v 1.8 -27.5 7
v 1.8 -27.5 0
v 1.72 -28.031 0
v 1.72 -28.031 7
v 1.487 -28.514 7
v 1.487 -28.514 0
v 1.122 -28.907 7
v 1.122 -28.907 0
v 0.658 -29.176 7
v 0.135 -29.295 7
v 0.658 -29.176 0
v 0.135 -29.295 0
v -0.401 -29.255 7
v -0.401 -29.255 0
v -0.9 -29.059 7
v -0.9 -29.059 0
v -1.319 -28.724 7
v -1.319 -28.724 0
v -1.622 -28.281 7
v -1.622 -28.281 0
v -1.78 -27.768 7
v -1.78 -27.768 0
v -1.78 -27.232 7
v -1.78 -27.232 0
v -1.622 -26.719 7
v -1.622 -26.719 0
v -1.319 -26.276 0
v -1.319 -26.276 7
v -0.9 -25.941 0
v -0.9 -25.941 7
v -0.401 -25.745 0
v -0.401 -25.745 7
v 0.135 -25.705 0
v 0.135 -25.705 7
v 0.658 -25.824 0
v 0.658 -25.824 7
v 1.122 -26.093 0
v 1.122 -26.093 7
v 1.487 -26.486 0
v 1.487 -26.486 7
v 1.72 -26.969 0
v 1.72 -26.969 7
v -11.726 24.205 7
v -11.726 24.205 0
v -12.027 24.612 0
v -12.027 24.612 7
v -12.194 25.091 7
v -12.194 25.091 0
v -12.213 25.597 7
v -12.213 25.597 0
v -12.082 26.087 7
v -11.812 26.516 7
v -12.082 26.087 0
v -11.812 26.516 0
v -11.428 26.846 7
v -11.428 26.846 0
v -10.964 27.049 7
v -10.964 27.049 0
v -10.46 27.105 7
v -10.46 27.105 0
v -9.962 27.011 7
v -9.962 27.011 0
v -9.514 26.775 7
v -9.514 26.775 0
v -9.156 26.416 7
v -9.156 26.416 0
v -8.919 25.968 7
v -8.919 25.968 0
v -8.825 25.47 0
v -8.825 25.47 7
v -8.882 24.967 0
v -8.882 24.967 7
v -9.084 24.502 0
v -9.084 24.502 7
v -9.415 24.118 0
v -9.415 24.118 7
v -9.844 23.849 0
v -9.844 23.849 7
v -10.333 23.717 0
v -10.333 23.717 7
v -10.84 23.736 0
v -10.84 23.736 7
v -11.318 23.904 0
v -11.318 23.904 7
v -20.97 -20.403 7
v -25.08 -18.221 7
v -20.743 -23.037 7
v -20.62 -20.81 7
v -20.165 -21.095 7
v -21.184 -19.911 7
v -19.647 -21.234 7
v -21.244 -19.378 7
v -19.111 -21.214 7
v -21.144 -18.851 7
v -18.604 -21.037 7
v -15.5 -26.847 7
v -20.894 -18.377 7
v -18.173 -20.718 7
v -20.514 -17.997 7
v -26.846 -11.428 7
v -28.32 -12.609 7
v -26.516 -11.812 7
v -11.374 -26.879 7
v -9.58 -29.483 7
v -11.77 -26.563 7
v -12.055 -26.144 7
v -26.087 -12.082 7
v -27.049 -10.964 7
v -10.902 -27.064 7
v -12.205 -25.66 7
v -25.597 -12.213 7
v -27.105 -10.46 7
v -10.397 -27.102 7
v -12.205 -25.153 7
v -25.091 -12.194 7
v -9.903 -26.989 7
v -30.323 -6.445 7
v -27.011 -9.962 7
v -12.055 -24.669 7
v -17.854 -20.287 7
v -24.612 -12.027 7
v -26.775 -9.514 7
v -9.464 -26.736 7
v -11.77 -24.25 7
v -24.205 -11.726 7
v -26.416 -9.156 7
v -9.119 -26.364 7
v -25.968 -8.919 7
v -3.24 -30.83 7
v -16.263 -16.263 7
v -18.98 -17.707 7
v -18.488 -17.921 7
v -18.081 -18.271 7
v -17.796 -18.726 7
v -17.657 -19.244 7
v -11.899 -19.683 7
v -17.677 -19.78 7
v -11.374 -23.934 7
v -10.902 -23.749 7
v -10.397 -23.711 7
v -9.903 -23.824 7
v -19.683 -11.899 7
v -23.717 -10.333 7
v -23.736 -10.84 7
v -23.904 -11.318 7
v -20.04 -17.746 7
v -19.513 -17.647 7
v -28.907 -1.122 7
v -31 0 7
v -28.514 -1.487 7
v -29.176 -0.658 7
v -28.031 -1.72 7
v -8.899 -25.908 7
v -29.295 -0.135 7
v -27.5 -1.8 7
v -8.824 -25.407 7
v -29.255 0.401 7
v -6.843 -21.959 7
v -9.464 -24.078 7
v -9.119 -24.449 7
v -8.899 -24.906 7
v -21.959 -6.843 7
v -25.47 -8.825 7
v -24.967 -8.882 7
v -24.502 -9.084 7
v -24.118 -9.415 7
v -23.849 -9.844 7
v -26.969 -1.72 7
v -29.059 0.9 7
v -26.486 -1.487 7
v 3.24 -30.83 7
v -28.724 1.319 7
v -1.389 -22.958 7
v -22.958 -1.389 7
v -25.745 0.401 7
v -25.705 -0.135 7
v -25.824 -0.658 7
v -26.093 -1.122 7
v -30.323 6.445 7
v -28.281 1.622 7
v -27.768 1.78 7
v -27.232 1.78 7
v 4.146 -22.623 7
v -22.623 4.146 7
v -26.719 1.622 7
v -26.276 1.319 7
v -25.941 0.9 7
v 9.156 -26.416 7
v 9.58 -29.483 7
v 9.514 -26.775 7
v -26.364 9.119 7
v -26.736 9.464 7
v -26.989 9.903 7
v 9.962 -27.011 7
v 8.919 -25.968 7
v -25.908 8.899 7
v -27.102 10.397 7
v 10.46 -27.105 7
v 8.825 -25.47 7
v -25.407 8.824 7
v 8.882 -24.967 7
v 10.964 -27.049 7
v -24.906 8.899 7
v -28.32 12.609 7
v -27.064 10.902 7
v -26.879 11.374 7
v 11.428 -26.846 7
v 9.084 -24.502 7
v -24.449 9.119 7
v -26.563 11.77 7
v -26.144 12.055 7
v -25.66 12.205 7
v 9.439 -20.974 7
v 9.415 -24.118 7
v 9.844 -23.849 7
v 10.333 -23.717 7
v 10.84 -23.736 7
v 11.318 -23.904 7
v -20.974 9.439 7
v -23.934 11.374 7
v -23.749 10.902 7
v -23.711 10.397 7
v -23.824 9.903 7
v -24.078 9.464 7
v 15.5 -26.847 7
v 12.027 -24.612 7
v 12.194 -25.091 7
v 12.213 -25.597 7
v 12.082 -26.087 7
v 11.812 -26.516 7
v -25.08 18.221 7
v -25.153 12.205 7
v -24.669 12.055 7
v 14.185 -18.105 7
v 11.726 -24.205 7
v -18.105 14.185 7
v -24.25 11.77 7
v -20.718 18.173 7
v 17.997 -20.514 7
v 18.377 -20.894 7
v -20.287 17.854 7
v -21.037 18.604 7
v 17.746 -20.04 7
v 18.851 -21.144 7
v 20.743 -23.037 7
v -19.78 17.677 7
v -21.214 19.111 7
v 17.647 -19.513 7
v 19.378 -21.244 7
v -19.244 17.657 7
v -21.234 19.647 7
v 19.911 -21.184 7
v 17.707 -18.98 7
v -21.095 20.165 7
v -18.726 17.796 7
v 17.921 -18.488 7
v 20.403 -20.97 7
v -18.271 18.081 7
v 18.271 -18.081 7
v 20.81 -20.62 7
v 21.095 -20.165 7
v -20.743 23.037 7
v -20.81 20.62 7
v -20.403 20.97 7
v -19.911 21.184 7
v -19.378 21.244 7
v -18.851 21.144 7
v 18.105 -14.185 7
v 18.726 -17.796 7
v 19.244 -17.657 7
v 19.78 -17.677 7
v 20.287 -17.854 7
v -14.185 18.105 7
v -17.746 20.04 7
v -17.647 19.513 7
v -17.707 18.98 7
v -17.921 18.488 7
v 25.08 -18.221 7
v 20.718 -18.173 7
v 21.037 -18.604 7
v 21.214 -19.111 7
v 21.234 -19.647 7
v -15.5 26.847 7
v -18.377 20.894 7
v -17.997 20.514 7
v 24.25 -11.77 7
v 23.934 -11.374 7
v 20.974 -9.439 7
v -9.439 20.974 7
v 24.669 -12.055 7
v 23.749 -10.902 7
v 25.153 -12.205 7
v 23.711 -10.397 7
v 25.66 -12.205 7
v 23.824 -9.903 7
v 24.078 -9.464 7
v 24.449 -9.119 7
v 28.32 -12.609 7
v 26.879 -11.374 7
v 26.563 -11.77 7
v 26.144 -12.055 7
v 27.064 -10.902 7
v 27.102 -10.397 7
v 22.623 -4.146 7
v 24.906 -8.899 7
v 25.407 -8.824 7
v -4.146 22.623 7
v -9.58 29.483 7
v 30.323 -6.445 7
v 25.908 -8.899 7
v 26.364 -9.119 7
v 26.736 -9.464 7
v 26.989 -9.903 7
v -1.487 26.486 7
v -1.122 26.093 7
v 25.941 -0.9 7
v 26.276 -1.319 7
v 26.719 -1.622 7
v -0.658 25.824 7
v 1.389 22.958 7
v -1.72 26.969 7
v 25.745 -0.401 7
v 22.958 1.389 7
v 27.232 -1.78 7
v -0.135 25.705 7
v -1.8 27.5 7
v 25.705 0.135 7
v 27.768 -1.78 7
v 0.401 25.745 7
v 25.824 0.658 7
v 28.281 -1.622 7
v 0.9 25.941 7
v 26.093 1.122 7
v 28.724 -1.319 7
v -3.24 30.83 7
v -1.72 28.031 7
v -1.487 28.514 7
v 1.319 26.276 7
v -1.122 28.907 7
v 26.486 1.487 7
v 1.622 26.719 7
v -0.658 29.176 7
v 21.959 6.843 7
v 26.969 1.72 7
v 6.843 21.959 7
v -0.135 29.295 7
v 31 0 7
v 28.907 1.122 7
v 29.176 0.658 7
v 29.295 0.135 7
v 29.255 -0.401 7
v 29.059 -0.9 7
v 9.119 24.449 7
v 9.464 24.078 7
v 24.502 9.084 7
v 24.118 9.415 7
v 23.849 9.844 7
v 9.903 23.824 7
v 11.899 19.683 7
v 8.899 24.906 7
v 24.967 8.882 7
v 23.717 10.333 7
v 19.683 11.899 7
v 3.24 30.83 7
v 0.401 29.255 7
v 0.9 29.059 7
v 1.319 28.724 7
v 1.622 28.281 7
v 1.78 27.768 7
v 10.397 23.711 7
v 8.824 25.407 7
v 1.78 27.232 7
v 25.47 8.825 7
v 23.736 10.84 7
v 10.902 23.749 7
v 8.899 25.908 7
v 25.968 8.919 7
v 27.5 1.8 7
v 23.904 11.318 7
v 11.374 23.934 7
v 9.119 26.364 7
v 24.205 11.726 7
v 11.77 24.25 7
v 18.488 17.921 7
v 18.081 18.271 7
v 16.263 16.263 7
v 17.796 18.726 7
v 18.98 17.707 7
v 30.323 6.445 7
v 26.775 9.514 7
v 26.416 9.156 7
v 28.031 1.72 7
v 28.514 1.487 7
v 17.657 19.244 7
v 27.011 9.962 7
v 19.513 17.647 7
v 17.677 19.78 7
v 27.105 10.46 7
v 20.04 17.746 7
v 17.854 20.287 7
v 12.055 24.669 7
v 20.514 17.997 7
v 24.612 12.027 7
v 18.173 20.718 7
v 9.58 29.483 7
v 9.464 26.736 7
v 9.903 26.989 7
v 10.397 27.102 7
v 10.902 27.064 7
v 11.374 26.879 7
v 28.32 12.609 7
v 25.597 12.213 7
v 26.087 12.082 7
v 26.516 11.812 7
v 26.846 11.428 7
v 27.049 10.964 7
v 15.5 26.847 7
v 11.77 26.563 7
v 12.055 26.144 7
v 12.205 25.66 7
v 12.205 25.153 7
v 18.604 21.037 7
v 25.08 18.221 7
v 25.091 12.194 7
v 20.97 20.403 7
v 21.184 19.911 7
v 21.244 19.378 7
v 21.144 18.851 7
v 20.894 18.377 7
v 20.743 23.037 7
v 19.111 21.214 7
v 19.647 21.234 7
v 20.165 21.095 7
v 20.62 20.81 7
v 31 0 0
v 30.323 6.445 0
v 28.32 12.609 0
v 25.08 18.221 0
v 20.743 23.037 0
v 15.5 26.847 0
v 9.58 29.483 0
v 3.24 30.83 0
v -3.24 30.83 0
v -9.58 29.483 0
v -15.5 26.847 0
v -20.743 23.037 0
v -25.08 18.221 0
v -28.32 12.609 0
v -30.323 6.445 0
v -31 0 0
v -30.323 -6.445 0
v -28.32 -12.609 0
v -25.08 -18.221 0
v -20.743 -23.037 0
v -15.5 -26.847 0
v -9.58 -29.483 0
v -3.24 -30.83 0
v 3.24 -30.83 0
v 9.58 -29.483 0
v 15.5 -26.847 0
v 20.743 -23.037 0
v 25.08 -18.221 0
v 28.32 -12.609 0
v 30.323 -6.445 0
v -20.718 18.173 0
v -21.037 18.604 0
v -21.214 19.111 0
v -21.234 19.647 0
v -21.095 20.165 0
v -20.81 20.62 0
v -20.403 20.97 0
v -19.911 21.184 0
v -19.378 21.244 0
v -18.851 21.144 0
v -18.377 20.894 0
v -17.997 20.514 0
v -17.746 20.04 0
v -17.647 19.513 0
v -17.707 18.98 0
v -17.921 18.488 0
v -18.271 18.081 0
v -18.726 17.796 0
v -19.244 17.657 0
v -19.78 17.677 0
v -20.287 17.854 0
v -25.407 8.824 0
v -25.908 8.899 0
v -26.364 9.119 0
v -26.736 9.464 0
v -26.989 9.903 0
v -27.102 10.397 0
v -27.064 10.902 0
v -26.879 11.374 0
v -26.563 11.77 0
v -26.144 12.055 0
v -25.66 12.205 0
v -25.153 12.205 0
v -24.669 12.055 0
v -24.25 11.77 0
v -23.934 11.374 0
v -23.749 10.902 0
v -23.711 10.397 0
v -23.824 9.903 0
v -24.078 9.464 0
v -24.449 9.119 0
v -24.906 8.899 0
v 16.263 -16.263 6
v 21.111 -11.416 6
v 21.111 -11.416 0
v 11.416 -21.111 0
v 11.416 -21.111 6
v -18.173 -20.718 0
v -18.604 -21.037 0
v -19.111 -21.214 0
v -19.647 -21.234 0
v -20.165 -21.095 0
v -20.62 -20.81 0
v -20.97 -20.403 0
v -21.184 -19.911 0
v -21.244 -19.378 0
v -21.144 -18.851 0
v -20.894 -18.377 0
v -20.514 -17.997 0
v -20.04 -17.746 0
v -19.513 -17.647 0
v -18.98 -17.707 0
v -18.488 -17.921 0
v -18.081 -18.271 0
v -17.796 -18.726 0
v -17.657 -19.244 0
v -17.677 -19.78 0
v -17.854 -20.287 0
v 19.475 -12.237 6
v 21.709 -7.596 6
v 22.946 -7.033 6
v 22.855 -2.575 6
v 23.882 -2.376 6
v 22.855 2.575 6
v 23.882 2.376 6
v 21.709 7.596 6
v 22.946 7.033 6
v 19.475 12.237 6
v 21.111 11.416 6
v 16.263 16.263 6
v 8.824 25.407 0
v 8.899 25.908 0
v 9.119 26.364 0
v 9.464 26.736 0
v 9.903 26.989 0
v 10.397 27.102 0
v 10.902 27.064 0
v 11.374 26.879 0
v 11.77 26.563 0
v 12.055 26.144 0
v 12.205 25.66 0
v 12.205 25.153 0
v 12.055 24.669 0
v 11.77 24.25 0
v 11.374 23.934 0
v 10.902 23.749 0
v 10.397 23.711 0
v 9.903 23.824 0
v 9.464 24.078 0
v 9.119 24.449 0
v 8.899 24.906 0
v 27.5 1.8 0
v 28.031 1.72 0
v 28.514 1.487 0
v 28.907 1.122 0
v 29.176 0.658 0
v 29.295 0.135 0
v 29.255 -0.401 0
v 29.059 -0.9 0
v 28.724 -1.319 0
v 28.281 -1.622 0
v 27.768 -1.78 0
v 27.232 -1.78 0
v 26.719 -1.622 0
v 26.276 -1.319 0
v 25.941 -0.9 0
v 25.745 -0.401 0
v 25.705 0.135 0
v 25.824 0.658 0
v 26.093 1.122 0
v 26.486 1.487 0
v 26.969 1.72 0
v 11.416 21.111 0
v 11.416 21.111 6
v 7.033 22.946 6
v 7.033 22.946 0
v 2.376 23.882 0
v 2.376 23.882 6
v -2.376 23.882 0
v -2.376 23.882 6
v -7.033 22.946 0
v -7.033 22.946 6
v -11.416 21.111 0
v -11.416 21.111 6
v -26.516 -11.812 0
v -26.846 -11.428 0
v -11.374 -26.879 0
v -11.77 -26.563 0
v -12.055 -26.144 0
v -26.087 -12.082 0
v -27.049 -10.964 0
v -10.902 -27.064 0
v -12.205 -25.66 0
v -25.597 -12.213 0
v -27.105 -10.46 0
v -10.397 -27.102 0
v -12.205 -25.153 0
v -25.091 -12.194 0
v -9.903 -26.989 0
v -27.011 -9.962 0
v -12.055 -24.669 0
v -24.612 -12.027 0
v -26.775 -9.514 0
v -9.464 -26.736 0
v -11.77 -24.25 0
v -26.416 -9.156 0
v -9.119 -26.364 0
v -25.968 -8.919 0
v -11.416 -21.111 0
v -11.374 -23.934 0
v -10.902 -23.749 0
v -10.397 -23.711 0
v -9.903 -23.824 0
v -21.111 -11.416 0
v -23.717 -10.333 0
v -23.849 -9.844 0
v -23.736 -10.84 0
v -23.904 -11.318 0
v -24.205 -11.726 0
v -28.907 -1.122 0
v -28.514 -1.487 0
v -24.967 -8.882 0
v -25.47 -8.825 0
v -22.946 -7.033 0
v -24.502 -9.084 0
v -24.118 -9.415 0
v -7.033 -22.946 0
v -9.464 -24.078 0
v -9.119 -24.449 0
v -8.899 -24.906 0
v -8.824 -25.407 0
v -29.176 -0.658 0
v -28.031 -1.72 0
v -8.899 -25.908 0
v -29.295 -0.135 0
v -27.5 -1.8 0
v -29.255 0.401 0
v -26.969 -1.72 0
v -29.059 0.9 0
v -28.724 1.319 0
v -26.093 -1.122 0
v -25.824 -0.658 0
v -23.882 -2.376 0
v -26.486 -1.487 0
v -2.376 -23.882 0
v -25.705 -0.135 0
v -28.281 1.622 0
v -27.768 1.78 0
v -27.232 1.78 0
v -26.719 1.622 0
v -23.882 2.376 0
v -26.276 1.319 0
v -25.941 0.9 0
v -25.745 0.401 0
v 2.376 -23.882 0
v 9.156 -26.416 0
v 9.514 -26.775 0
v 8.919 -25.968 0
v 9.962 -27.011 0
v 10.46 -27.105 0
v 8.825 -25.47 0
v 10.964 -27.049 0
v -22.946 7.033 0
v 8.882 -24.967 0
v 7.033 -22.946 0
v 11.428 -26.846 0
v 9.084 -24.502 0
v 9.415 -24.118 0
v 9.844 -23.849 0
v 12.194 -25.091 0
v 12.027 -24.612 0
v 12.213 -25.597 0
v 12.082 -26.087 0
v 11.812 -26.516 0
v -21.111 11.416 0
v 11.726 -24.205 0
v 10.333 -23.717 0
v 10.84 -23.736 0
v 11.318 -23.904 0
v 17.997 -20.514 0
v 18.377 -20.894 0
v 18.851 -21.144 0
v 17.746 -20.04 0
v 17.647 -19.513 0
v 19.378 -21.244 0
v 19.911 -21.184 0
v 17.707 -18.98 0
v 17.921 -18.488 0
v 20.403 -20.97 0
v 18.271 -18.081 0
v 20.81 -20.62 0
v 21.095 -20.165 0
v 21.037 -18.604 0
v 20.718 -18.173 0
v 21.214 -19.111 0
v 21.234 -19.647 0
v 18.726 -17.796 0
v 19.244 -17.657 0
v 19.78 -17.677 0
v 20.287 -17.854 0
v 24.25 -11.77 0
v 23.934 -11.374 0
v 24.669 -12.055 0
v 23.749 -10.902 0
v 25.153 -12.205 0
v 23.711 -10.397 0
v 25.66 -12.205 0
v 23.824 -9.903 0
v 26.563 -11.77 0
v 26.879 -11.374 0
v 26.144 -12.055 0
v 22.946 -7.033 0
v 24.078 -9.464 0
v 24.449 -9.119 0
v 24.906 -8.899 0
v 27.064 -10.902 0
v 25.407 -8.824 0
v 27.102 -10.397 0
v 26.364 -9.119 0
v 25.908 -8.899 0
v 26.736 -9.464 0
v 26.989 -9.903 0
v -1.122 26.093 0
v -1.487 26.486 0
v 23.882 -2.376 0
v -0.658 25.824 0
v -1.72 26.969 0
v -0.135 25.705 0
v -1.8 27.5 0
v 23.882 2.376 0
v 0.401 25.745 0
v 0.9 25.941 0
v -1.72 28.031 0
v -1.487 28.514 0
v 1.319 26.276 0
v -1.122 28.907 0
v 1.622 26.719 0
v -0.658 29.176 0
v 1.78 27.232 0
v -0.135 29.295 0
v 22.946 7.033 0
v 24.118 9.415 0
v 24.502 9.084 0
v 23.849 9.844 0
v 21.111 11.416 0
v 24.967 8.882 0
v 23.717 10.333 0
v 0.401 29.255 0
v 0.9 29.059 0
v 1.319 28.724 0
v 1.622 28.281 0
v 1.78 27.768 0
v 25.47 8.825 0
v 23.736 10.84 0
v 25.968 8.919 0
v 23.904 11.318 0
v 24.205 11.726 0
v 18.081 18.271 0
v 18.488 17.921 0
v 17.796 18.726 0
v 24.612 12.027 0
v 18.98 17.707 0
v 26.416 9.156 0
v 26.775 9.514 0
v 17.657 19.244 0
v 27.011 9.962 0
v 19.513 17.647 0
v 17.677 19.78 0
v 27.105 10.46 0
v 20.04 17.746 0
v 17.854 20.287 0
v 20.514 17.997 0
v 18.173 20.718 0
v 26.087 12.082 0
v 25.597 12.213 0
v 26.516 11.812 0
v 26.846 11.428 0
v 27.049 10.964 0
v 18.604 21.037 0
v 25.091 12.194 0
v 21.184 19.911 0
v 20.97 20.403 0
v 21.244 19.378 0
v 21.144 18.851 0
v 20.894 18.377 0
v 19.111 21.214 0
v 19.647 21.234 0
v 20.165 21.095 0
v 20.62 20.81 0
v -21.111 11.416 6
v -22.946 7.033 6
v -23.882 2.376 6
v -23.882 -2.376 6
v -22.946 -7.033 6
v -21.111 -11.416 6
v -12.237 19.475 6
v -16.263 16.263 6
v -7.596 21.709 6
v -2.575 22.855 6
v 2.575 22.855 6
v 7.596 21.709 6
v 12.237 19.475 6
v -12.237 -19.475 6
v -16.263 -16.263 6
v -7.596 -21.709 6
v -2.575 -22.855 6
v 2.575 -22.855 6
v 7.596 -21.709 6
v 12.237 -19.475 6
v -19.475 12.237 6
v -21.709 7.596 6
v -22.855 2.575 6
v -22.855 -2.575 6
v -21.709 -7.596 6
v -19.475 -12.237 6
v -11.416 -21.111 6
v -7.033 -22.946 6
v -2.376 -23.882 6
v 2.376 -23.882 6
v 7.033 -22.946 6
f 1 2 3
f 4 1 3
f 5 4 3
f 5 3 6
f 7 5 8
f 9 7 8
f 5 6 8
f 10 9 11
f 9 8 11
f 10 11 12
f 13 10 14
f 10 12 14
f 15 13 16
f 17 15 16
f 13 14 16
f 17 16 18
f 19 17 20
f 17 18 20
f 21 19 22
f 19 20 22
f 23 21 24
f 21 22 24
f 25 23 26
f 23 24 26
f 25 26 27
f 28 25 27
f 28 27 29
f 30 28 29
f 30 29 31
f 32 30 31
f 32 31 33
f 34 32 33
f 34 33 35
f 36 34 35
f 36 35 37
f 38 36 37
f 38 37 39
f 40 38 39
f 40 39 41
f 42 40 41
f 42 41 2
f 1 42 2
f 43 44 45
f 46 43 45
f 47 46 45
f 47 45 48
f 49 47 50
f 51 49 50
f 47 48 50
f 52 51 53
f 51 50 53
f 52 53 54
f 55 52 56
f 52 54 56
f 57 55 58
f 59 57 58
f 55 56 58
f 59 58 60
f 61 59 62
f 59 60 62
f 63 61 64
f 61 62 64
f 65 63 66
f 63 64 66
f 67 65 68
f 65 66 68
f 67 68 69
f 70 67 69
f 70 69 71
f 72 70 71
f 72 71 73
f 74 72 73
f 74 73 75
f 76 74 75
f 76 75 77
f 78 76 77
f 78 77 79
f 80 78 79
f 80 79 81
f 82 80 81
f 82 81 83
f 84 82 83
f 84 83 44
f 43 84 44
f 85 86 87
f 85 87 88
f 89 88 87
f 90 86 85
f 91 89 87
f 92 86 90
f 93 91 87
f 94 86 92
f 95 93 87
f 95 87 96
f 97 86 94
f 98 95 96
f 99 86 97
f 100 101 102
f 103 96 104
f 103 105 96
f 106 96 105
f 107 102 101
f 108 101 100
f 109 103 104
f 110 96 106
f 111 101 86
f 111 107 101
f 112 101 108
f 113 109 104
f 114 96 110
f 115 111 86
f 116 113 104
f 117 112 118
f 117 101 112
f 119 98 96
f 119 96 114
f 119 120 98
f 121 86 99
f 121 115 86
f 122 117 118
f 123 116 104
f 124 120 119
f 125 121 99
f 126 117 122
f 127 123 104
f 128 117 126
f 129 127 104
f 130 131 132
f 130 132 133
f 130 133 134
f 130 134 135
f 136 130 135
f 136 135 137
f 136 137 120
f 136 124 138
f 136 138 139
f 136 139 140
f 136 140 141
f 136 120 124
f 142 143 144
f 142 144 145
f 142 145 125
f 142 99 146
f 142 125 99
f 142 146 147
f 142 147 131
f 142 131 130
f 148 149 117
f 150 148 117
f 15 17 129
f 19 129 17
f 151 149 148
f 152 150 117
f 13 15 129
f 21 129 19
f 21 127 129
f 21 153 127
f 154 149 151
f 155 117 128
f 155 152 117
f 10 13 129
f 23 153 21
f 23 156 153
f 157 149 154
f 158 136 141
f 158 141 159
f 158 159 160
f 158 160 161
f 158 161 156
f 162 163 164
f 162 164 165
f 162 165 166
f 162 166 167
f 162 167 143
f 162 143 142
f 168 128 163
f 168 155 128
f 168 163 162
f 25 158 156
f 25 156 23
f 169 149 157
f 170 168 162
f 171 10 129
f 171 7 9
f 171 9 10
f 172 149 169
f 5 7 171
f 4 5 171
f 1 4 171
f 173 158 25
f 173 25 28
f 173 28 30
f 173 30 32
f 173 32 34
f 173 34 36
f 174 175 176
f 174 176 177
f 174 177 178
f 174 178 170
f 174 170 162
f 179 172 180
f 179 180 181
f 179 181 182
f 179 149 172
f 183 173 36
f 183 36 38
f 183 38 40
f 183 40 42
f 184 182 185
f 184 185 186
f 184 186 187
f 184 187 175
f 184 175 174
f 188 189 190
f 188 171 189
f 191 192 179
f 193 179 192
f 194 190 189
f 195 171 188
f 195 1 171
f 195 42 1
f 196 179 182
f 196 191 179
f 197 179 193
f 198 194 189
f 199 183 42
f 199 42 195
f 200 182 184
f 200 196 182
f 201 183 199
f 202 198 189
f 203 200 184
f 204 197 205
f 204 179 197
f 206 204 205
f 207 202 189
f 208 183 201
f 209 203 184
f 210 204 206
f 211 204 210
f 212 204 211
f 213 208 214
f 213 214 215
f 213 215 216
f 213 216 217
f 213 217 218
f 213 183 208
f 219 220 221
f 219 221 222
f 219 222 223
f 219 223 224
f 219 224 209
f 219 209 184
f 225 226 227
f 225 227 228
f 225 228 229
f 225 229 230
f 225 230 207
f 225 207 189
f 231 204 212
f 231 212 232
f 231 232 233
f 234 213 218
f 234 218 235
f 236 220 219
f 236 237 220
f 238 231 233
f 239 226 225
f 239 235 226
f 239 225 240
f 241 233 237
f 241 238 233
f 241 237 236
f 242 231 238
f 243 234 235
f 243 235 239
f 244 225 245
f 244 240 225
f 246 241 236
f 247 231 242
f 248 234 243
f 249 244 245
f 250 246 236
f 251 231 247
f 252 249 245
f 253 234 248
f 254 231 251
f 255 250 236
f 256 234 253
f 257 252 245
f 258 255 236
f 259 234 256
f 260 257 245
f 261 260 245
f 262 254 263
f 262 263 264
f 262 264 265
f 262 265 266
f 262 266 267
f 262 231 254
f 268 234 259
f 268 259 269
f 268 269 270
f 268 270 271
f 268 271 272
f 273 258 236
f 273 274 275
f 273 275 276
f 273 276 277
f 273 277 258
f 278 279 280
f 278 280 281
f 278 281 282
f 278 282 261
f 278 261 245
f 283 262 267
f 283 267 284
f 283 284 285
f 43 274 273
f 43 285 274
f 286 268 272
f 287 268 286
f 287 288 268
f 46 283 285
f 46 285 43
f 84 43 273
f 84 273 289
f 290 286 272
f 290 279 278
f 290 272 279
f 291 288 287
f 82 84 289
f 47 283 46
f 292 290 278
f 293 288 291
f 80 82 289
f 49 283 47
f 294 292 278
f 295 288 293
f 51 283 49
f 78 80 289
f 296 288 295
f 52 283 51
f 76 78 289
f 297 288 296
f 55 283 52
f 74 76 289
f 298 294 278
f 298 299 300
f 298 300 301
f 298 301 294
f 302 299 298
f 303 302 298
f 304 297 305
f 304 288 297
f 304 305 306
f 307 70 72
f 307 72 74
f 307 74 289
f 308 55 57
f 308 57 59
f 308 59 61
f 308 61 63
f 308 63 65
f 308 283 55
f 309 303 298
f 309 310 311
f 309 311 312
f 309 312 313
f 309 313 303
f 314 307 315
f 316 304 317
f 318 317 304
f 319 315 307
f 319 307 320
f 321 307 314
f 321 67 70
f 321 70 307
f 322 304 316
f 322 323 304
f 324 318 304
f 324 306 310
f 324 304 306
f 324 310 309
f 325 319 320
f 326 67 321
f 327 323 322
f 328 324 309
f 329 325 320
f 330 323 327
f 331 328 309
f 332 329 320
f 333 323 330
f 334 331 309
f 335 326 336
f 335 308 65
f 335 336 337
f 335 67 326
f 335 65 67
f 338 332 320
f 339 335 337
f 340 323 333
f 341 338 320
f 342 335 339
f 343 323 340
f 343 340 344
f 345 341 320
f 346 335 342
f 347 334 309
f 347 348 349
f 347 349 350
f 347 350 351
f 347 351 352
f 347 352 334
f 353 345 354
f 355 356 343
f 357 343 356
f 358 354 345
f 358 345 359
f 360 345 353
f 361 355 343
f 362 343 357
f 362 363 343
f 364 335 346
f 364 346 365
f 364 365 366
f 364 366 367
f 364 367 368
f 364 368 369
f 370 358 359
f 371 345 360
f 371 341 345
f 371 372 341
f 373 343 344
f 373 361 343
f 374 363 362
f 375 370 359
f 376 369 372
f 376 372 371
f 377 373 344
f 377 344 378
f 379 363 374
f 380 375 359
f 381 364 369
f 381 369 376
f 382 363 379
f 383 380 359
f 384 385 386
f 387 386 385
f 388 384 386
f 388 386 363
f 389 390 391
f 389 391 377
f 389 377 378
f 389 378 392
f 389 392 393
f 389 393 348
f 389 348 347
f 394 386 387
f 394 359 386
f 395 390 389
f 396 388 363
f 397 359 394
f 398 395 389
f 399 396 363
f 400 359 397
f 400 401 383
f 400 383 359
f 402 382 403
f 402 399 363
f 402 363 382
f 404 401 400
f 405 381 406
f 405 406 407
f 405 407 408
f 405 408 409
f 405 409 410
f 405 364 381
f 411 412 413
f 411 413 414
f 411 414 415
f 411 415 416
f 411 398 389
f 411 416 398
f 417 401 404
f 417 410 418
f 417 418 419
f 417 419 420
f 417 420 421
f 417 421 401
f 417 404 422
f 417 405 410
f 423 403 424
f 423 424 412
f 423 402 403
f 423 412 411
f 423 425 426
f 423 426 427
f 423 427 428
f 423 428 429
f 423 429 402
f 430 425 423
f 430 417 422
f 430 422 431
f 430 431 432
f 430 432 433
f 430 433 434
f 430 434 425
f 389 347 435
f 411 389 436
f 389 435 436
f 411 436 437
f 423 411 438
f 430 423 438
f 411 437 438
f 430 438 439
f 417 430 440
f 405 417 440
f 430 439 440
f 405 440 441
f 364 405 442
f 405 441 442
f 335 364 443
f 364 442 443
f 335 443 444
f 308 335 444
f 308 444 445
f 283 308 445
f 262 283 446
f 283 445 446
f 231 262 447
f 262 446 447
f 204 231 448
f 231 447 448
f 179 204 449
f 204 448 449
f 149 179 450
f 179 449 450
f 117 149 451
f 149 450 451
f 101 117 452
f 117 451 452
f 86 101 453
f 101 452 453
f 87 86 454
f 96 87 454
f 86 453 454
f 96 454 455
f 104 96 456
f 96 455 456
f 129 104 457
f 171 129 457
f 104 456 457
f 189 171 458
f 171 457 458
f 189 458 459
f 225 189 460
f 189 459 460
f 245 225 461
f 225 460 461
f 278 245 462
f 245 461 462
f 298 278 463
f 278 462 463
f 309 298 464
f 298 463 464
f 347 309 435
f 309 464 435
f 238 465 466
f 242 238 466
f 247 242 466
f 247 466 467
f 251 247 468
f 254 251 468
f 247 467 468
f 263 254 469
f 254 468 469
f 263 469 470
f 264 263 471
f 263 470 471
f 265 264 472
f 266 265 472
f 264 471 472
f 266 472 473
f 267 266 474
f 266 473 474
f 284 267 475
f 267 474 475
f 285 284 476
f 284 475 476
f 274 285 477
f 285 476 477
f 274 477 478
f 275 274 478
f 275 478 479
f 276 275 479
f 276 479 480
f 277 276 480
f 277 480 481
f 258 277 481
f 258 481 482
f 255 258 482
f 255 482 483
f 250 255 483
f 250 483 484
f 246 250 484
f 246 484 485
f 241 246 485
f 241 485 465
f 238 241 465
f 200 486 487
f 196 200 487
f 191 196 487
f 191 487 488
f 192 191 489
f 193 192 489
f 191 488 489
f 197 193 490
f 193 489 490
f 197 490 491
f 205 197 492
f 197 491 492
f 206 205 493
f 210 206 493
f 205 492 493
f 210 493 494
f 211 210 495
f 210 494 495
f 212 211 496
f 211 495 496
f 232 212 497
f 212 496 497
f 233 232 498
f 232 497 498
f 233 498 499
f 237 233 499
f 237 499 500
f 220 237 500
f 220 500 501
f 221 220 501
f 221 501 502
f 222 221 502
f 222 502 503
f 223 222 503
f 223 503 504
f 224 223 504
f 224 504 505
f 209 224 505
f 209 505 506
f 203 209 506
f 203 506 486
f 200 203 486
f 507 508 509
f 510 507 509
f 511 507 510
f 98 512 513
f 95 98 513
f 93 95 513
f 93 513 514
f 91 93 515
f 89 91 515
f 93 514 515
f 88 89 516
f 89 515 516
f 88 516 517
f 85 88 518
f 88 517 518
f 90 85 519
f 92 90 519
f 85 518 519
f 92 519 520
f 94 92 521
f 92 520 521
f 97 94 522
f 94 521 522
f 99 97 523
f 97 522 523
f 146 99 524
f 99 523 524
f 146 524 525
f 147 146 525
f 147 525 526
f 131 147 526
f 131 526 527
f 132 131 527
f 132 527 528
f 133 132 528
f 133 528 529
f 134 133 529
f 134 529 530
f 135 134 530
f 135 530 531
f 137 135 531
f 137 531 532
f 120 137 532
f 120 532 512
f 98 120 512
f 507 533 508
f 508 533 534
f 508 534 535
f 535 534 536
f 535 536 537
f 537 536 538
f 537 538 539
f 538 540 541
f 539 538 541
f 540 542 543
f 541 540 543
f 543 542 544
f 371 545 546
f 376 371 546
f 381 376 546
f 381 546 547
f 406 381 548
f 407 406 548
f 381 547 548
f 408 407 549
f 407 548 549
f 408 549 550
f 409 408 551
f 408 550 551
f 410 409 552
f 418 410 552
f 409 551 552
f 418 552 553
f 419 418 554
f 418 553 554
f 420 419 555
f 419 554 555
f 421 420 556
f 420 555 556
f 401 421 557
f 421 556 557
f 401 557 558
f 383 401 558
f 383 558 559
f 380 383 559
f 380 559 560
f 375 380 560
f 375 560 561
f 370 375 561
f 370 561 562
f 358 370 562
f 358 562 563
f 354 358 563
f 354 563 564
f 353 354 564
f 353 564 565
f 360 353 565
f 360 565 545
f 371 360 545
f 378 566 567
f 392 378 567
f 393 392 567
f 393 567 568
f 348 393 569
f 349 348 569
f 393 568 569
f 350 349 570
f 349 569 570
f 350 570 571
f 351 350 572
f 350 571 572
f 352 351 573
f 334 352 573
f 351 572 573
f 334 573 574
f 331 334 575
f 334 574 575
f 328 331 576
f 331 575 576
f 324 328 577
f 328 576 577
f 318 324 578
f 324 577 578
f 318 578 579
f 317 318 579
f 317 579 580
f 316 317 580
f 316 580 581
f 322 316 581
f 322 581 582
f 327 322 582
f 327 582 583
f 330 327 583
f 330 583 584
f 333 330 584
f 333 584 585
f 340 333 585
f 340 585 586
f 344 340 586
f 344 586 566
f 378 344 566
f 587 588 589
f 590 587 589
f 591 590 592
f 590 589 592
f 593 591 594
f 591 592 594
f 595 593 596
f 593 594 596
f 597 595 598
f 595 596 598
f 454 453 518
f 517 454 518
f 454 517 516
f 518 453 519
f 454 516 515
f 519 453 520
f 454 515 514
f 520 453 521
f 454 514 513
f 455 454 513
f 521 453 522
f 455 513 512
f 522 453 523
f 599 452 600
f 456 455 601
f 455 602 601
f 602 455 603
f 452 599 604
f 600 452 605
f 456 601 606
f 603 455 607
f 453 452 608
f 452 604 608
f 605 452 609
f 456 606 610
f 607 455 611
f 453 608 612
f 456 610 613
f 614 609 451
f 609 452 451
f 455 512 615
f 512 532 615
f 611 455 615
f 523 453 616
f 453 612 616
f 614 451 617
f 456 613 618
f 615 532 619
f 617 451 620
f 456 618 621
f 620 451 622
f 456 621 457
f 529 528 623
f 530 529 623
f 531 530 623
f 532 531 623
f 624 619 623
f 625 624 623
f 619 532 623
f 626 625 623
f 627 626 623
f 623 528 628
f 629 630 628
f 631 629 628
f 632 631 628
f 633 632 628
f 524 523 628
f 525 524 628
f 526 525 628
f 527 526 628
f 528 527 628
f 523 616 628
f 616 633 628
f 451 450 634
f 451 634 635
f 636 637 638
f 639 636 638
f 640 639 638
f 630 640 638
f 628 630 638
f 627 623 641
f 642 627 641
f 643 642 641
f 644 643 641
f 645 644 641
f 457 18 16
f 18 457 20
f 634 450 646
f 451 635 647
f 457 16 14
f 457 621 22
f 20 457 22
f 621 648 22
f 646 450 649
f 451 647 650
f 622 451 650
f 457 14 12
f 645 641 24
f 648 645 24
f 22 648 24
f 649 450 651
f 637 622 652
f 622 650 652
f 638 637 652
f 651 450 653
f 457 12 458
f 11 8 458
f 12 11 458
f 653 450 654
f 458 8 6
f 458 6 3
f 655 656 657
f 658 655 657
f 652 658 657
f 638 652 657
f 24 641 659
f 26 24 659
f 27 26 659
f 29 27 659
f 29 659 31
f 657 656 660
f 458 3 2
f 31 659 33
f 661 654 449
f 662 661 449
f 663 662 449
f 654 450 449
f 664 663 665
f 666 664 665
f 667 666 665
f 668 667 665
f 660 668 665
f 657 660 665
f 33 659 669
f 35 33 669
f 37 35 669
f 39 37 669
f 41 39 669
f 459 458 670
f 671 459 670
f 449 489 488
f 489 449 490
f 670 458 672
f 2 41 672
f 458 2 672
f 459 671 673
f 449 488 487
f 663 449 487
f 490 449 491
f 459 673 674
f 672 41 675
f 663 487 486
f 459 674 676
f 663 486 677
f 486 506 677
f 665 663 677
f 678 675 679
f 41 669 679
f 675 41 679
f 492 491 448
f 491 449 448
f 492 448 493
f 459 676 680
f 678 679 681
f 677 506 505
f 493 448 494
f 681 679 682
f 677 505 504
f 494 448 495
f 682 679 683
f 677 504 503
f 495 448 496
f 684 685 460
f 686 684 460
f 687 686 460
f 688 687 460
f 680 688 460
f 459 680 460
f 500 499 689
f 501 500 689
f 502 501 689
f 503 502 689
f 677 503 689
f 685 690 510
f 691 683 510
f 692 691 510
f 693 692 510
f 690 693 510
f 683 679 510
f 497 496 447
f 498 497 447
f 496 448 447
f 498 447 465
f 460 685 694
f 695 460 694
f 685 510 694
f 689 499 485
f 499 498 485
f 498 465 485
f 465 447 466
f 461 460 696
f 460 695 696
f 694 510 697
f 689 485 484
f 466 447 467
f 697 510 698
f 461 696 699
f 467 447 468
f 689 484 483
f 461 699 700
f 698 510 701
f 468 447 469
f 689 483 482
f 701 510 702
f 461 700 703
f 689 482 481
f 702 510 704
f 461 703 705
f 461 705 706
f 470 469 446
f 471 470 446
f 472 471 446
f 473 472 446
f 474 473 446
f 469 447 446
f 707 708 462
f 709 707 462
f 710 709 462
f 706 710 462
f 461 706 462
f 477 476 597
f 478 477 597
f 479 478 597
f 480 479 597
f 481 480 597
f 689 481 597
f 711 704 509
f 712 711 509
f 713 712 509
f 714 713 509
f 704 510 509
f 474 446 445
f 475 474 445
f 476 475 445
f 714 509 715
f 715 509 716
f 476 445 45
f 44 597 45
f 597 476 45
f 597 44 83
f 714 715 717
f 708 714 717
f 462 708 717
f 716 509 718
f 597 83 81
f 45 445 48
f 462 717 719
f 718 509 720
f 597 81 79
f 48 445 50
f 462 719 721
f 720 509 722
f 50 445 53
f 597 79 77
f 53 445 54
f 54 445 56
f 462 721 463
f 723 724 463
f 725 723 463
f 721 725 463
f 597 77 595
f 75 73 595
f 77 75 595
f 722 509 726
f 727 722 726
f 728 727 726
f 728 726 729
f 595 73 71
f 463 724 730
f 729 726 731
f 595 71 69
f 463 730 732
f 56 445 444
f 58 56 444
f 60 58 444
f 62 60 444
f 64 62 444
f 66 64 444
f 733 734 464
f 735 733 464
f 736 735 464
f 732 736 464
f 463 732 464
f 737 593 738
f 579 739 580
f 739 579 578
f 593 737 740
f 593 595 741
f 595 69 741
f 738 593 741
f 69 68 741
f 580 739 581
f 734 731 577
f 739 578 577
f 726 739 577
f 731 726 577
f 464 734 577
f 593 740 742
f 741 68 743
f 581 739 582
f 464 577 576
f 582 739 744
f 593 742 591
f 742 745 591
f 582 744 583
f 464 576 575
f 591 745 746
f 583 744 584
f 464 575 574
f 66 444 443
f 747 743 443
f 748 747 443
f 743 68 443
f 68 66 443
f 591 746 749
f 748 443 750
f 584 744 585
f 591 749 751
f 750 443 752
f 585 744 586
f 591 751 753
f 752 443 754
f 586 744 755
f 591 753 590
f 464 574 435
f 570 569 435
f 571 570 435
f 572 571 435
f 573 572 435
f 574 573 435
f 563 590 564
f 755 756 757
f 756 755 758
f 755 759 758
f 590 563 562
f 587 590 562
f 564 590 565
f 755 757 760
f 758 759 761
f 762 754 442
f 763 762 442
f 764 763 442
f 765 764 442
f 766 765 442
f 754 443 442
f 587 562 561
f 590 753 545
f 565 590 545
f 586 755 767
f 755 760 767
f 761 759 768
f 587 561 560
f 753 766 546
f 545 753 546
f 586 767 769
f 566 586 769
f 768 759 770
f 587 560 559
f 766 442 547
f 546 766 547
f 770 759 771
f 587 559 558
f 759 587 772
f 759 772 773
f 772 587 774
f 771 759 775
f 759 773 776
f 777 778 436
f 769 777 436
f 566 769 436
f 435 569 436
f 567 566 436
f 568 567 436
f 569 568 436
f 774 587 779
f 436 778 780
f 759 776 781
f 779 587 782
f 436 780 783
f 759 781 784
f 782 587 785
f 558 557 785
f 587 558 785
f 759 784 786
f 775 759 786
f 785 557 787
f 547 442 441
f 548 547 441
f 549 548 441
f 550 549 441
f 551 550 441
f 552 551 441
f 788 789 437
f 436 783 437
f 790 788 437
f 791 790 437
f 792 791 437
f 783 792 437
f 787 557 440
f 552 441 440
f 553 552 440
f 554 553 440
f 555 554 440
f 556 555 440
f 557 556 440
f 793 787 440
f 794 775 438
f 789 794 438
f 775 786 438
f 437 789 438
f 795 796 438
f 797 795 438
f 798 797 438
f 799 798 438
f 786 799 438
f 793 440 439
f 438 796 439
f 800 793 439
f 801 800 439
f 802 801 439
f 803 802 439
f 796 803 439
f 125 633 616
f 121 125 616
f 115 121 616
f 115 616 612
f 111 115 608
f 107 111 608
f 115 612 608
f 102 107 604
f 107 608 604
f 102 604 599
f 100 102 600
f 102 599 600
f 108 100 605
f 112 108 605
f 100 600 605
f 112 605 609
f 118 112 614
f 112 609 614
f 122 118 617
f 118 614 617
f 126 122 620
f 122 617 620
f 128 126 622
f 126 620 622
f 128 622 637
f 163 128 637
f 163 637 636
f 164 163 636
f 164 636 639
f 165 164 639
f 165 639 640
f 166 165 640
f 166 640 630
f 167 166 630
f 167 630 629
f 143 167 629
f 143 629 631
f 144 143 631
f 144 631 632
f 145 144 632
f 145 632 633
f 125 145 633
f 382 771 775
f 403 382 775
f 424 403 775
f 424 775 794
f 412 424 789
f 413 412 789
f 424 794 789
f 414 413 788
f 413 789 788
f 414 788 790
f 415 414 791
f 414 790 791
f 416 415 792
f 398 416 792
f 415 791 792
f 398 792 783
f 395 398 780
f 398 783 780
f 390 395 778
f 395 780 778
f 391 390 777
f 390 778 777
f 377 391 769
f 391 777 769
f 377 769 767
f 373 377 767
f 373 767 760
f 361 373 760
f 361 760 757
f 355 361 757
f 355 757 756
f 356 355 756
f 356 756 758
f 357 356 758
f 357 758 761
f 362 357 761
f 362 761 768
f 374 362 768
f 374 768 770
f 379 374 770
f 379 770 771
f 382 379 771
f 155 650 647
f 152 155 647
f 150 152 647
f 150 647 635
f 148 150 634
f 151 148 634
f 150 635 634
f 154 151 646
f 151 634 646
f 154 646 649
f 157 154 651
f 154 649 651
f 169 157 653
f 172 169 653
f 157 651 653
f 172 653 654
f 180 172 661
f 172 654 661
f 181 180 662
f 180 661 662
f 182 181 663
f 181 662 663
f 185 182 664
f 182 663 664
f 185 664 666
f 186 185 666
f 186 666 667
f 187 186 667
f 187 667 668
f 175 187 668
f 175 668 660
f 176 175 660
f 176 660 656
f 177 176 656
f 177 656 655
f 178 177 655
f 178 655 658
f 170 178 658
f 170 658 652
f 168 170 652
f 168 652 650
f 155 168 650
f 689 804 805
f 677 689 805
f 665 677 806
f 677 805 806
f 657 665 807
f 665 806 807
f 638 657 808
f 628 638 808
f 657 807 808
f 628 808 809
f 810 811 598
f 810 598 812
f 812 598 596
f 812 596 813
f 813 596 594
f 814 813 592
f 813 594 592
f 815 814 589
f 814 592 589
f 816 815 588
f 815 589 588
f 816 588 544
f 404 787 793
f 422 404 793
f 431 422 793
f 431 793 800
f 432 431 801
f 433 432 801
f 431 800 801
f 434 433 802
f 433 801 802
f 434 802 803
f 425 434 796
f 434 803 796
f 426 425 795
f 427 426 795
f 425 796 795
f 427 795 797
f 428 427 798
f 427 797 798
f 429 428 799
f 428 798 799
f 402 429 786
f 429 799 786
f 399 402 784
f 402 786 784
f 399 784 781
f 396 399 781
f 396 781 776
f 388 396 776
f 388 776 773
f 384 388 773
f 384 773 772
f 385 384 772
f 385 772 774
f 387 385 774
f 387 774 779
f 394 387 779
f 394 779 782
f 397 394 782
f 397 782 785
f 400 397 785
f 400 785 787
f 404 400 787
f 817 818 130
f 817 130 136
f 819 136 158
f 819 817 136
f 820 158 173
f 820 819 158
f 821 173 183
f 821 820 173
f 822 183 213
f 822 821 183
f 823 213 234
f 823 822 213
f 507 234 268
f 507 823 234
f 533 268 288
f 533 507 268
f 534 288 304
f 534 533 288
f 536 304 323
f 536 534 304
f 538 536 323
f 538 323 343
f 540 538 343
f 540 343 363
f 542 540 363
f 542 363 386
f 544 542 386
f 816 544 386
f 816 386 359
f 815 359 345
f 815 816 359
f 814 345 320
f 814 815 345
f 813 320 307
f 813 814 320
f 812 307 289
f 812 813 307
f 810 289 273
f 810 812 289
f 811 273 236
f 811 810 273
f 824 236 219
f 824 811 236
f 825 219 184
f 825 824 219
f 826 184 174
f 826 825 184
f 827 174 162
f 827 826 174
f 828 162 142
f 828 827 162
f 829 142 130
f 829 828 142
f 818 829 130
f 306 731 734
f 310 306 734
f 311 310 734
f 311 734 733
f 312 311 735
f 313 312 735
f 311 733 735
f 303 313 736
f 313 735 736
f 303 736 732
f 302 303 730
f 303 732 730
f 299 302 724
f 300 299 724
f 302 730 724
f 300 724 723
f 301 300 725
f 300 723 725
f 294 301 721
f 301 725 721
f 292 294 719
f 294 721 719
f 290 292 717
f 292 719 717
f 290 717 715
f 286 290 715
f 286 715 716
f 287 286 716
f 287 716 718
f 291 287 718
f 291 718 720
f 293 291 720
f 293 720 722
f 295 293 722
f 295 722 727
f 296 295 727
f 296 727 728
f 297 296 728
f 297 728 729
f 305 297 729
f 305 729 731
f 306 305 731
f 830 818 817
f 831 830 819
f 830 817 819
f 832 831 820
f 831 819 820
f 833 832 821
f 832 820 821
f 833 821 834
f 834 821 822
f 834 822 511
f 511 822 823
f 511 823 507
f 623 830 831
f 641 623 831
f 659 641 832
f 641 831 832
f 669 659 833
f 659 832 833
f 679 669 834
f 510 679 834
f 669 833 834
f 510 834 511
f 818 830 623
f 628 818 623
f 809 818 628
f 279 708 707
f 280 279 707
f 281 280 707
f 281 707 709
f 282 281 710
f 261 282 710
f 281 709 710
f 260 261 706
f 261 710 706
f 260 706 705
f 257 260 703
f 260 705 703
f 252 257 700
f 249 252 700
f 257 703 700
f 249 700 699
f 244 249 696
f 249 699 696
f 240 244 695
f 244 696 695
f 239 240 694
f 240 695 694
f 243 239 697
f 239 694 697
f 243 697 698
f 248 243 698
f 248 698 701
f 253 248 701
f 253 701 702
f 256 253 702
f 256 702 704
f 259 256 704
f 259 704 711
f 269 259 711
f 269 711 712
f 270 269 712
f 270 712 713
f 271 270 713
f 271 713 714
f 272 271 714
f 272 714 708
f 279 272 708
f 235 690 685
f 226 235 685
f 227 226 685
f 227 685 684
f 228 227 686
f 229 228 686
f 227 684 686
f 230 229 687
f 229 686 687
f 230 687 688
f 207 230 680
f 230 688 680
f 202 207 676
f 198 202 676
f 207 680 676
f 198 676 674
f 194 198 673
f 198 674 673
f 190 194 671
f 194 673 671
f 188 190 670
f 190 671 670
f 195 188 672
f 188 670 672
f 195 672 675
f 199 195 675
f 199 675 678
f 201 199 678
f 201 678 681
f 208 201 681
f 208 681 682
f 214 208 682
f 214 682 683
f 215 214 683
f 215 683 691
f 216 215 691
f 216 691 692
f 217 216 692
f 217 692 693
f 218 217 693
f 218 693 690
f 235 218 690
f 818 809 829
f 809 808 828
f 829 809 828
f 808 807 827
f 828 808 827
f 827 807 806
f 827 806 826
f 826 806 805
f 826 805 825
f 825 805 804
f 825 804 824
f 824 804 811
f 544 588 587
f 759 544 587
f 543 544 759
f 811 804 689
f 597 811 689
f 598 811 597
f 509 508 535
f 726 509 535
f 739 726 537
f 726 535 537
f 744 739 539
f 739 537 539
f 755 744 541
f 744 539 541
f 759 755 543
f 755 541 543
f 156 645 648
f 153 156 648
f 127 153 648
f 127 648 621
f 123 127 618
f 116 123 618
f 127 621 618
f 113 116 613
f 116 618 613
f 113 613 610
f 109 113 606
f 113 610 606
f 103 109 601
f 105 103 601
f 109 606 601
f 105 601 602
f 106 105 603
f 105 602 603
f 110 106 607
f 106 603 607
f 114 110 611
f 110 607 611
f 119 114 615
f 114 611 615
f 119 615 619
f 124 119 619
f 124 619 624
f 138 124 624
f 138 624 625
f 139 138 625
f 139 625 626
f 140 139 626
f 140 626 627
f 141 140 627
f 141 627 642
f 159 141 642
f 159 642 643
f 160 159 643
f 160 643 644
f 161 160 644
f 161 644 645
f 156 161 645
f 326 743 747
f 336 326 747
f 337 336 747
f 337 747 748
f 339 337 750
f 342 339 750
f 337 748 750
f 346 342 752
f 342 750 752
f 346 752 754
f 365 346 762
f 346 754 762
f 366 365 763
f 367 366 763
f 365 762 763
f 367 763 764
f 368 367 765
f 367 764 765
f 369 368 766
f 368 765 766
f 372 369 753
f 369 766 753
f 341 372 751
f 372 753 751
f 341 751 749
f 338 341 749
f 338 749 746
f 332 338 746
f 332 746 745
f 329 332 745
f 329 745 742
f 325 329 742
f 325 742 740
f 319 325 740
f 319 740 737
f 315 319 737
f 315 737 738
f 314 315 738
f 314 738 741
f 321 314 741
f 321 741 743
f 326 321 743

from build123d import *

# Parameters (mm, degrees)
SKETCH_1_R               = 31
EXTRUDE_1_DEPTH          = 6
SKETCH_2_R               = 24
CUT_EXTRUDE_1_DEPTH      = 45.24929378
EXTRUDE_2_DEPTH          = 6
SKETCH_5_R               = 31
SKETCH_5_R_2             = 23
EXTRUDE_3_DEPTH          = 1
HOLE_WIZARD_M3_1_D       = 3.6
PATTERN_CIRCULAR_1_COUNT = 8
HOLE_WIZARD_M3_2_D       = 3.4
PATTERN_CIRCULAR_4_COUNT = 8


with BuildPart() as part:
    # ｽｹｯﾁ1 → ﾎﾞｽ - 押し出し1 (new body)
    with BuildSketch(Plane.XY):
        Circle(SKETCH_1_R)
    extrude(amount=EXTRUDE_1_DEPTH)

    # ｽｹｯﾁ2 → ｶｯﾄ - 押し出し1 (cut, through all)
    with BuildSketch(Plane.XY.offset(6)):
        Circle(SKETCH_2_R)
    extrude(amount=-CUT_EXTRUDE_1_DEPTH, mode=Mode.SUBTRACT)

    # ｽｹｯﾁ3 → ﾎﾞｽ - 押し出し2 (add, through all)
    with BuildSketch(Plane.XY.offset(6)):
        with BuildLine():
            ThreePointArc((-11.41577611, 21.111135825), (-16.970562748, 16.970562748), (-21.111135825, 11.41577611))
            Line((-21.111135825, 11.41577611), (-11.41577611, 21.111135825))
        make_face()
        with BuildLine():
            Line((-11.41577611, -21.111135825), (-21.111135825, -11.41577611))
            ThreePointArc((-21.111135825, -11.41577611), (-16.970562748, -16.970562748), (-11.41577611, -21.111135825))
        make_face()
        with BuildLine():
            ThreePointArc((21.111135825, 11.41577611), (16.970562748, 16.970562748), (11.41577611, 21.111135825))
            Line((11.41577611, 21.111135825), (21.111135825, 11.41577611))
        make_face()
        with BuildLine():
            Line((21.111135825, -11.41577611), (11.41577611, -21.111135825))
            ThreePointArc((11.41577611, -21.111135825), (16.970562748, -16.970562748), (21.111135825, -11.41577611))
        make_face()
    extrude(amount=-EXTRUDE_2_DEPTH)

    # ｽｹｯﾁ5 → ﾎﾞｽ - 押し出し3 (add)
    with BuildSketch(Plane.XY.offset(6)):
        Circle(SKETCH_5_R)
        with Locations(Location((0, 0, 0), (0, 0, 225))):
            Circle(SKETCH_5_R_2, mode=Mode.SUBTRACT)
    extrude(amount=EXTRUDE_3_DEPTH)

    # M3 すきま穴1 (through all)
    with Locations(Plane.XY.offset(7)):
        with Locations((0, 27.5)):
            hole_wizard_m3_1 = Hole(HOLE_WIZARD_M3_1_D / 2)

    # 円形ﾊﾟﾀｰﾝ1: M3 すきま穴1 ×8 about axis
    pattern_circular_1_axis = Axis((0, 0, 0), (0, 0, 1))
    for i in range(1, PATTERN_CIRCULAR_1_COUNT):
        add(hole_wizard_m3_1.rotate(pattern_circular_1_axis, i * 360 / PATTERN_CIRCULAR_1_COUNT), mode=Mode.SUBTRACT)

    # M3 すきま穴2 (through all)
    with Locations(Plane.XY.offset(7)):
        with Locations((10.52379439, 25.406687144)):
            hole_wizard_m3_2 = Hole(HOLE_WIZARD_M3_2_D / 2)

    # 円形ﾊﾟﾀｰﾝ4: M3 すきま穴2 ×8 about axis
    pattern_circular_4_axis = Axis((0, 0, 0), (0, 0, 1))
    for i in range(1, PATTERN_CIRCULAR_4_COUNT):
        add(hole_wizard_m3_2.rotate(pattern_circular_4_axis, i * 360 / PATTERN_CIRCULAR_4_COUNT), mode=Mode.SUBTRACT)


solid = part.part
